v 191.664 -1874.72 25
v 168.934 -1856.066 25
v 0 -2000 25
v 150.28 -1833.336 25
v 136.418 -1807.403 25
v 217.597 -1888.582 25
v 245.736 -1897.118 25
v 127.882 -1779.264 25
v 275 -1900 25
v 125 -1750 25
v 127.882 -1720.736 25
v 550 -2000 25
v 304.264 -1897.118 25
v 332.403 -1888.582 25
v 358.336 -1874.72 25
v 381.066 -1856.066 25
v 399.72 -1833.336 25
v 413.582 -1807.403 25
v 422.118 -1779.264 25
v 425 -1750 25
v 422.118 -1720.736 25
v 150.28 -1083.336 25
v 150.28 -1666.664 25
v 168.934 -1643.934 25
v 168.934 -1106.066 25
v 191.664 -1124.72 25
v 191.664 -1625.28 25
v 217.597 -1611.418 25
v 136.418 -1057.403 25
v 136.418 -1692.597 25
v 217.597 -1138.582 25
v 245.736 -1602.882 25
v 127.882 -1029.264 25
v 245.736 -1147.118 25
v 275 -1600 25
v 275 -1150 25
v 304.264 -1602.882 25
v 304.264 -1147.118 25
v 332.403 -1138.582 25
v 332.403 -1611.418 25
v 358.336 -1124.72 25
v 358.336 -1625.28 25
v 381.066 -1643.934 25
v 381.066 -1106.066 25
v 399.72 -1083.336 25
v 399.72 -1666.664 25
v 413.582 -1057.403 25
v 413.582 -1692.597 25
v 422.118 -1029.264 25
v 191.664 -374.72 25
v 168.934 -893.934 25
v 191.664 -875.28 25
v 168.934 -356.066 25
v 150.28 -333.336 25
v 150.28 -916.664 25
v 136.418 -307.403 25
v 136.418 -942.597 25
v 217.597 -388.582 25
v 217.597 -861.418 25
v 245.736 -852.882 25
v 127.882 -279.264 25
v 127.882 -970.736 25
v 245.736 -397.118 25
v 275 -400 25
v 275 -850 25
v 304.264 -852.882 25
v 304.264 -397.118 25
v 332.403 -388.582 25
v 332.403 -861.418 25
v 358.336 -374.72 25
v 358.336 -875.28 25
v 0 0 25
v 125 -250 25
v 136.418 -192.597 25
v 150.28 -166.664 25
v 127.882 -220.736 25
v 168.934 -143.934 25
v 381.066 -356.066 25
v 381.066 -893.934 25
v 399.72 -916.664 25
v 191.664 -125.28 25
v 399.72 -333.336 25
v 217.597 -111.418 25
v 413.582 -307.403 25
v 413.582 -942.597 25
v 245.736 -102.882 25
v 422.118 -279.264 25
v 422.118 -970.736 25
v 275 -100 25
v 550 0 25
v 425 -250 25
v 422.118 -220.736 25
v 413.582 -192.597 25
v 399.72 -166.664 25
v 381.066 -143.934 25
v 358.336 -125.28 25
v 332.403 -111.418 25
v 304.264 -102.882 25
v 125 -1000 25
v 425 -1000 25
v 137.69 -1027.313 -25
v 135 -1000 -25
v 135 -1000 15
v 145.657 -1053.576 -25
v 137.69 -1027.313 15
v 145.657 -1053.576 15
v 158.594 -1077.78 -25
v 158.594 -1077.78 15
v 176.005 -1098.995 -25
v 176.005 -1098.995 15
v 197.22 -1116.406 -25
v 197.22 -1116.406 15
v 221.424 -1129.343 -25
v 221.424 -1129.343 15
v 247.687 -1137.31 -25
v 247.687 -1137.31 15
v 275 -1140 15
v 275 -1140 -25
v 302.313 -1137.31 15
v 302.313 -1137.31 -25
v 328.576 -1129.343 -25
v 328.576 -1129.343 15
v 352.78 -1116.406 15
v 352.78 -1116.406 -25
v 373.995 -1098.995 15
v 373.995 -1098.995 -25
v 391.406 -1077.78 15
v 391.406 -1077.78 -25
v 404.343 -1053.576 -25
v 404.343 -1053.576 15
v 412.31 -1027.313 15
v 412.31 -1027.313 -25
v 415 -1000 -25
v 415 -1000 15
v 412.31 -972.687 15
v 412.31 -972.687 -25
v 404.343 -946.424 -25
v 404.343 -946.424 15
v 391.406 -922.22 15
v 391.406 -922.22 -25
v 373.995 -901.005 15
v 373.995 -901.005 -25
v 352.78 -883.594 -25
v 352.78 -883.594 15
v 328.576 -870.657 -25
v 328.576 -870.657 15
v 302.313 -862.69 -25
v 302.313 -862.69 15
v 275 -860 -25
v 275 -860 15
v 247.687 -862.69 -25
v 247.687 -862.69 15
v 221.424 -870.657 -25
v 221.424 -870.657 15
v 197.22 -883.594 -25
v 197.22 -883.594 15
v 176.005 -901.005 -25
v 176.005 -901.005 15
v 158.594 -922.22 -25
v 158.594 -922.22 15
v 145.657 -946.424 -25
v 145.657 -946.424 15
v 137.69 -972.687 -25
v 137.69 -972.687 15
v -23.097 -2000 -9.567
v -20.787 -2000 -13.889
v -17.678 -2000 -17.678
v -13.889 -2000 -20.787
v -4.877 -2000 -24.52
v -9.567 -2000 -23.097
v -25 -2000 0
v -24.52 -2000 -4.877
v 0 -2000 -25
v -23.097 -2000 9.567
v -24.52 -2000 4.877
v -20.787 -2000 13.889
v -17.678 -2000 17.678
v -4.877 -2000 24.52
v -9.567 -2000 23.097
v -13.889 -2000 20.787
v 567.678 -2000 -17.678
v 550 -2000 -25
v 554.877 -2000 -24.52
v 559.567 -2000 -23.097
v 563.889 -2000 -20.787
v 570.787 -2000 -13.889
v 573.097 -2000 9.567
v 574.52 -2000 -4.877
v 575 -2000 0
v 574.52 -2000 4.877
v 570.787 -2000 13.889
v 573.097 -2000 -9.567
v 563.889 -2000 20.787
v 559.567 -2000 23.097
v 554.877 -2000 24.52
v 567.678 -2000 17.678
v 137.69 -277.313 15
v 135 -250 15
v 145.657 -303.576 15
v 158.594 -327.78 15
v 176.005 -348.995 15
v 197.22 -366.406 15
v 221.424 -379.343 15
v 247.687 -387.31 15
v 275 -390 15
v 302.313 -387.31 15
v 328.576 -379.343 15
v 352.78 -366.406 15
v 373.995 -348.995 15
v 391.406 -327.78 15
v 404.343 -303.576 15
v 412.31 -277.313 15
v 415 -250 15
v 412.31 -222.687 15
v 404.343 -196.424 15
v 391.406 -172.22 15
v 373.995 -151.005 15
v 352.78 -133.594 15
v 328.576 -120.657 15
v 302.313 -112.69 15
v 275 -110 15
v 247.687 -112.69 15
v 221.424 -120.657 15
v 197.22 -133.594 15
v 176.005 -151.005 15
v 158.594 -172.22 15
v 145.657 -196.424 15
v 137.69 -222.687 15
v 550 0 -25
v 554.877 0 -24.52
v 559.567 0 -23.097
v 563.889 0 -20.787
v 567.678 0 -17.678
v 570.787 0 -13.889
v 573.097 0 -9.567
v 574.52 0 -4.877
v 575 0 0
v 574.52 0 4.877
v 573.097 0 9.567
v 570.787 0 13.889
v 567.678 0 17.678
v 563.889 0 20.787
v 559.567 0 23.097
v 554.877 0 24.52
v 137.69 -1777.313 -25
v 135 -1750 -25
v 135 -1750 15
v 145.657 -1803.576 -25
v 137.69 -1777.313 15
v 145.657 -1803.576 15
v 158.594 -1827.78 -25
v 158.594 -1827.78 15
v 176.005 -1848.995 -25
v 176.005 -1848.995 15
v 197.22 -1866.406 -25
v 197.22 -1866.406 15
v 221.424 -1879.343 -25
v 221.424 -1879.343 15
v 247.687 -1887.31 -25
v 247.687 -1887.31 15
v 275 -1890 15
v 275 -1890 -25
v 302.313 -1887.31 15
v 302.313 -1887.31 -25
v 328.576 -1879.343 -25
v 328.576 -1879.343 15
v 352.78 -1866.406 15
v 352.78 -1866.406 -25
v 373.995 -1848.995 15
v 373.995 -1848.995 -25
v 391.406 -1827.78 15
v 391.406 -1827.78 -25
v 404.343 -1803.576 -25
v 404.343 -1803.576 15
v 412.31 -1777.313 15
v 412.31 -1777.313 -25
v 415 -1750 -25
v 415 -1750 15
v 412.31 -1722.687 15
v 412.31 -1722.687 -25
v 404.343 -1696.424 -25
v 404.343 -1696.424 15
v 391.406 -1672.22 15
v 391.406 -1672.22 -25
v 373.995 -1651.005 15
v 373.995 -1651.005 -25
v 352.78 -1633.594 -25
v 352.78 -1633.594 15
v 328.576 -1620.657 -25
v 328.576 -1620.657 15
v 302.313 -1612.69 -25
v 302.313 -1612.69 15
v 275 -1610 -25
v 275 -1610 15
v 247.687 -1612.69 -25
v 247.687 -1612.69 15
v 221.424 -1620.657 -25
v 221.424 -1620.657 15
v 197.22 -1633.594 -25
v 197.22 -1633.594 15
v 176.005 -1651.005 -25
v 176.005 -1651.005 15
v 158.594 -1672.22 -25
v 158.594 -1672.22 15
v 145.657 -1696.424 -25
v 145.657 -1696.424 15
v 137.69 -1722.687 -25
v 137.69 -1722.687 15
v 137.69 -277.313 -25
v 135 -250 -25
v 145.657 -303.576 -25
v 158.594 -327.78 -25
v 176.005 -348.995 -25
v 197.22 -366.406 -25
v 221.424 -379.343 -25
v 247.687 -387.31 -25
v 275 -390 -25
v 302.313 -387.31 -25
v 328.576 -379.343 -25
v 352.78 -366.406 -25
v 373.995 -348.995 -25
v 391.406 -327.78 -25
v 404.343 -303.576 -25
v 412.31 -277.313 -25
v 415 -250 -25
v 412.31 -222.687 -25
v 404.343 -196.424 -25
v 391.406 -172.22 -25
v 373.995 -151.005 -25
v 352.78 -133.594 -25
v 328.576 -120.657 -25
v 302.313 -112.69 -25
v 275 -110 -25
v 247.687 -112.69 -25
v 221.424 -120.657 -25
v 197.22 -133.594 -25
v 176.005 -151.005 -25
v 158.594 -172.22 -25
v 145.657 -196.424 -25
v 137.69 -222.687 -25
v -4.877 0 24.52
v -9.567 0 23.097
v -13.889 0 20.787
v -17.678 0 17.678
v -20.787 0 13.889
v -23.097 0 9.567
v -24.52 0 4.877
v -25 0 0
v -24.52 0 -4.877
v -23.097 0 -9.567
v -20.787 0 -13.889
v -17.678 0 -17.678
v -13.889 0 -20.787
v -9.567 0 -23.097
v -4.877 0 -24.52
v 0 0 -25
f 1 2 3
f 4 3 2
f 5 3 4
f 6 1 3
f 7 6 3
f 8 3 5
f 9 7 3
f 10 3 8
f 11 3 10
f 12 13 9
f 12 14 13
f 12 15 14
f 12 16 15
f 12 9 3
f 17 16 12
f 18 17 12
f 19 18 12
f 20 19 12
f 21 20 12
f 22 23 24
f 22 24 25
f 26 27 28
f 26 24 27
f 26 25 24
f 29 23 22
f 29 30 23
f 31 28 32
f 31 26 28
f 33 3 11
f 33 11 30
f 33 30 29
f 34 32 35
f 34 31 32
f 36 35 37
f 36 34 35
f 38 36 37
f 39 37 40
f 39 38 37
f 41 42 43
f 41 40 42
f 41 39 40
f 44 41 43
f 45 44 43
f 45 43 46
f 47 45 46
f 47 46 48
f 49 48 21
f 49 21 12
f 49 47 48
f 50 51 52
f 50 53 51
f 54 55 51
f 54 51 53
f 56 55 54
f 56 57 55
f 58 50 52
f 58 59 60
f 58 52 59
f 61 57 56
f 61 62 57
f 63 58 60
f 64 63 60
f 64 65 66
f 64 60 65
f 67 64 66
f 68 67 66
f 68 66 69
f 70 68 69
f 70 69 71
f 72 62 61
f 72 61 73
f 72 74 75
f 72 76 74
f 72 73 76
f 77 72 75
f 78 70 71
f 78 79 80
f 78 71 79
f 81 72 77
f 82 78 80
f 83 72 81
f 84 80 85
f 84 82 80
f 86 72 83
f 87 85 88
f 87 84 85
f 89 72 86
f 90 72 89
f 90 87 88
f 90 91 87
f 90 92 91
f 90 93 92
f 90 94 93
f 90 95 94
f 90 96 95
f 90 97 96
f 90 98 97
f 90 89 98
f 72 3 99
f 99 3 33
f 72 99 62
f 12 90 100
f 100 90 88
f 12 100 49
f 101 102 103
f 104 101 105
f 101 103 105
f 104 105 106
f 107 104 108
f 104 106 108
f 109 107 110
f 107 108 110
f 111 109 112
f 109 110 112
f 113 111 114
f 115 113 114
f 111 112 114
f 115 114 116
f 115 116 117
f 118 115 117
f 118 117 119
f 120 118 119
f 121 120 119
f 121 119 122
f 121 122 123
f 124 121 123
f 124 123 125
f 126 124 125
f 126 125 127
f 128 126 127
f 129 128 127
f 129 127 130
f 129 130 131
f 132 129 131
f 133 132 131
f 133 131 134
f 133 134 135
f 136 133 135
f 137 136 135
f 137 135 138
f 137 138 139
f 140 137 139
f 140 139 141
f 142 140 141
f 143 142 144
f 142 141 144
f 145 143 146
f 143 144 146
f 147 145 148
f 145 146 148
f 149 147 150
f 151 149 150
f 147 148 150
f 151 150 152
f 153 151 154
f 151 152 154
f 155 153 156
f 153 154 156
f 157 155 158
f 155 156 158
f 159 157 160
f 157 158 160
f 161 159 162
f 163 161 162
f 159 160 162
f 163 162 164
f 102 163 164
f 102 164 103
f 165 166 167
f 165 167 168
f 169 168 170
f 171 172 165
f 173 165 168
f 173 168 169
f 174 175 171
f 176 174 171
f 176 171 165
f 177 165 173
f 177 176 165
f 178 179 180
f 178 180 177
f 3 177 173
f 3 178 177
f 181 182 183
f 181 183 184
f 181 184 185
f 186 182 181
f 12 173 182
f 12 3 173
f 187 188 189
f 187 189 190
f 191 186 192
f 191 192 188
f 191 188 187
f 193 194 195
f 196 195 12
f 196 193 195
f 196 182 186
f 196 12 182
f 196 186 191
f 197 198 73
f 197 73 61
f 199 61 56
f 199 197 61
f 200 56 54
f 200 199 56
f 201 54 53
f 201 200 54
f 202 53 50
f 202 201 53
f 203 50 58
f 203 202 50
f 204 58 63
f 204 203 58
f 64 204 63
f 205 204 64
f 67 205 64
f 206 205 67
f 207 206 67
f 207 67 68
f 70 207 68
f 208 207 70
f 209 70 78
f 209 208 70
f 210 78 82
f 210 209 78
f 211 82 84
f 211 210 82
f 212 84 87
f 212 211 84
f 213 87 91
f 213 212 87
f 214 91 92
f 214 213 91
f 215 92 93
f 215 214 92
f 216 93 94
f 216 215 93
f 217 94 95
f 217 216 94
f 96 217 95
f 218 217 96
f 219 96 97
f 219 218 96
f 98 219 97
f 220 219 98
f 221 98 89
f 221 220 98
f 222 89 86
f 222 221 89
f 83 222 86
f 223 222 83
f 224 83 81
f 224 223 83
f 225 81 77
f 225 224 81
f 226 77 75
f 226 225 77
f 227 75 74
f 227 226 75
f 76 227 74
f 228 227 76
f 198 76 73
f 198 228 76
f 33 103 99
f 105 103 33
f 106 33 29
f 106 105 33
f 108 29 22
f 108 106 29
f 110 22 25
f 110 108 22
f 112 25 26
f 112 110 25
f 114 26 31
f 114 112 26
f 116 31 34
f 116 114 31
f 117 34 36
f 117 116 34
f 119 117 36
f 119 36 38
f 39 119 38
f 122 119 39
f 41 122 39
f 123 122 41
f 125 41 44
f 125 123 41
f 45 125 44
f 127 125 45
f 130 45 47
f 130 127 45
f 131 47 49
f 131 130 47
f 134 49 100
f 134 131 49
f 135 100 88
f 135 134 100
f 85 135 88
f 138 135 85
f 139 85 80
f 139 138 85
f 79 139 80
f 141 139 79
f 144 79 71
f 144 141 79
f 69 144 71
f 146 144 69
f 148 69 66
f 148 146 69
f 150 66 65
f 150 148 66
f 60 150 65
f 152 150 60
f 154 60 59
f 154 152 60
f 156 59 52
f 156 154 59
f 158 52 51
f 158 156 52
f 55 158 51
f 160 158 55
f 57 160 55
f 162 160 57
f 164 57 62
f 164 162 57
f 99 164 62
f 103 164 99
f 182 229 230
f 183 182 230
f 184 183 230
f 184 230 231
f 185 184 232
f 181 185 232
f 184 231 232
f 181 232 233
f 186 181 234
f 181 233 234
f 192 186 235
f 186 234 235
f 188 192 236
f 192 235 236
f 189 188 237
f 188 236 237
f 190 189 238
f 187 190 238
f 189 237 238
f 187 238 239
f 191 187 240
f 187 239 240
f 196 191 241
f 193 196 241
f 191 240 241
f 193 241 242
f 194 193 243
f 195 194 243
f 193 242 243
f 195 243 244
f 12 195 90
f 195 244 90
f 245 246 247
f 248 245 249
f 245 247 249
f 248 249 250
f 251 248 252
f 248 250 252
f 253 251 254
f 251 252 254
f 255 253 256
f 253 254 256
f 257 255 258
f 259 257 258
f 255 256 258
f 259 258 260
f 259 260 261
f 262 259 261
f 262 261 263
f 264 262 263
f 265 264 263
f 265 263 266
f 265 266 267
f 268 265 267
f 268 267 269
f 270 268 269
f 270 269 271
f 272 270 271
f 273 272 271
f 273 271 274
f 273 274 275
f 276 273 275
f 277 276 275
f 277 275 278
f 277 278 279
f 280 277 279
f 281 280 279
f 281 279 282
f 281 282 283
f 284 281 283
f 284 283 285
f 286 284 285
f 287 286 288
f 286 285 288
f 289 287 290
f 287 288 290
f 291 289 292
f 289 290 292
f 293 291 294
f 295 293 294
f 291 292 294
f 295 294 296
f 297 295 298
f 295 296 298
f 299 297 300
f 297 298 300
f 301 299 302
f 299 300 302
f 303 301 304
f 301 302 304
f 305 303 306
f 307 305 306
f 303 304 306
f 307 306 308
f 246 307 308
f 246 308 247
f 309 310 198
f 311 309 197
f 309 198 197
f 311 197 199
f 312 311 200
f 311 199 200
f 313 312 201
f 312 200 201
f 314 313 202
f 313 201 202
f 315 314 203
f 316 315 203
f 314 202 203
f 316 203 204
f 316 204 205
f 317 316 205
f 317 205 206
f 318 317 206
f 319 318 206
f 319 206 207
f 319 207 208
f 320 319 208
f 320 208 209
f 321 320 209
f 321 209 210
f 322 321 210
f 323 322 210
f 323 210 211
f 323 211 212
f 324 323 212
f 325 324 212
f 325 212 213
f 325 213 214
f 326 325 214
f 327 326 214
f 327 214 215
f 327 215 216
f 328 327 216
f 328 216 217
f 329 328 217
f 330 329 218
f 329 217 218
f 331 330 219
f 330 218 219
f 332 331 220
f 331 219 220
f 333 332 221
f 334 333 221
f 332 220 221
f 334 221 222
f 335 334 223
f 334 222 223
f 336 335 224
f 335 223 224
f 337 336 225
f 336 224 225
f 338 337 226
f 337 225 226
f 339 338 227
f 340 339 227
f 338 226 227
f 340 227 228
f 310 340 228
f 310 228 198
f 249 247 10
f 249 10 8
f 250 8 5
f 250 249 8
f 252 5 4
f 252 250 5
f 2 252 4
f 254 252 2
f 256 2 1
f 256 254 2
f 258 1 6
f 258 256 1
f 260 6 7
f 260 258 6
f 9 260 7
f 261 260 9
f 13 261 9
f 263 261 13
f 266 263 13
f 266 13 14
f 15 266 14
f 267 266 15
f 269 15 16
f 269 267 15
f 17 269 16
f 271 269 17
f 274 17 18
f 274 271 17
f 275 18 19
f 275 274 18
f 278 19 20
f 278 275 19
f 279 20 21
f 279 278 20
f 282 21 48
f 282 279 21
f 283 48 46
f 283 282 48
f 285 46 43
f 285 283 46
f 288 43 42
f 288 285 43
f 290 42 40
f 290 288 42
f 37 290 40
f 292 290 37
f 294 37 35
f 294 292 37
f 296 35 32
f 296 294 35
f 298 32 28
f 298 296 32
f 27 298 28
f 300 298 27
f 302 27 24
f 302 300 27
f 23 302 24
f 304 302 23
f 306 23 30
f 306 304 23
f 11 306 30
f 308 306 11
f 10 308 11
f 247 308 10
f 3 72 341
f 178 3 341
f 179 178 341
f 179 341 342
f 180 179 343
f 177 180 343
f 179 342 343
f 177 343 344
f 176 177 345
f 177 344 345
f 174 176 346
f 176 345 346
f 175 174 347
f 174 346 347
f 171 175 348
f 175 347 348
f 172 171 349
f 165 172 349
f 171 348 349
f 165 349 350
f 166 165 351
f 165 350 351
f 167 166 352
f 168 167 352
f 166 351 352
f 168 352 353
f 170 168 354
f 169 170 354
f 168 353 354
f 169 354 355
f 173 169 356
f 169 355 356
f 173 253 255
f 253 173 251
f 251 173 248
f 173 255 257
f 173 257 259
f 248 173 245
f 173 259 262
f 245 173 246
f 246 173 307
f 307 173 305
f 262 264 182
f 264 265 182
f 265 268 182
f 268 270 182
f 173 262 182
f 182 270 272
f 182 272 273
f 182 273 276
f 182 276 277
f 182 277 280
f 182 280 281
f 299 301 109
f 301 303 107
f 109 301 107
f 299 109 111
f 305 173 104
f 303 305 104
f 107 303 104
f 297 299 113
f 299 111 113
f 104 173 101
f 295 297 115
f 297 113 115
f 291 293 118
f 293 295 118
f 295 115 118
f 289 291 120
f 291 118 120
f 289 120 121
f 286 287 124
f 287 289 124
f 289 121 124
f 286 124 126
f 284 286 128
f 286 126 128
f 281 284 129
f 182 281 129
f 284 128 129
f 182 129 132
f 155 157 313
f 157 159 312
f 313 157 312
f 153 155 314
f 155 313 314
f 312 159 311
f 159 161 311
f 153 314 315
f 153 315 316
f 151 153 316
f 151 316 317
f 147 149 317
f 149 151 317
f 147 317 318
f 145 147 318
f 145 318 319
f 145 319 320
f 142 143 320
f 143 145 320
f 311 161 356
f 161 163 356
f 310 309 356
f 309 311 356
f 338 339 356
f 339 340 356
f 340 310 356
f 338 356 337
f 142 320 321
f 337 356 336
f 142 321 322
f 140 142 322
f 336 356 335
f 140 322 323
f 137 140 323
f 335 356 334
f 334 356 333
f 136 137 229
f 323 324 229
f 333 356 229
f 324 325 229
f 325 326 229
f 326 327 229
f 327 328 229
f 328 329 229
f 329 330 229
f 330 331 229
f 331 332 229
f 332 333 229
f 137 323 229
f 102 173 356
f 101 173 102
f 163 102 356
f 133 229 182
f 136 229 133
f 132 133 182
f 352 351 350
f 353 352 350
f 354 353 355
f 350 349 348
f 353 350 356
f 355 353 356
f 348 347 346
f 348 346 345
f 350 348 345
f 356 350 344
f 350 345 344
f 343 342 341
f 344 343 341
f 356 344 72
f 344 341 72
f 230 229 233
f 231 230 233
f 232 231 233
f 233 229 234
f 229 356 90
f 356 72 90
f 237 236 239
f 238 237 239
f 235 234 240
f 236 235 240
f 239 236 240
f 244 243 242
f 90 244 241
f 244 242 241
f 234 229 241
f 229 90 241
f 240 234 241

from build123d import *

# Parameters (mm, degrees)
PAD_DEPTH    = 2000
SKETCH001_R  = 140
POCKET_DEPTH = 50.001
CHAMFER_SIZE = 10


with BuildPart() as part:
    # Sketch → Pad (new body)
    with BuildSketch(Plane.XZ):
        with BuildLine():
            ThreePointArc((0, 25), (-25, 0), (0, -25))
            Line((0, -25), (550, -25))
            ThreePointArc((550, -25), (575, 0), (550, 25))
            Line((0, 25), (550, 25))
        make_face()
    extrude(amount=PAD_DEPTH)

    # Sketch001 (on Face4 of Pad) → Pocket (cut, through all)
    with BuildSketch(Plane(origin=(0, 0, 25), x_dir=(-1, 0, 0), z_dir=(0, 0, 1))):
        with Locations((-275, 1750)):
            Circle(SKETCH001_R)
        with Locations((-275, 1000)):
            Circle(SKETCH001_R)
        with Locations((-275, 250)):
            Circle(SKETCH001_R)
    extrude(amount=-POCKET_DEPTH, mode=Mode.SUBTRACT)

    # Chamfer
    chamfer_edges = [part.edges().sort_by_distance(p)[0] for p in [
        (415, -1750, 25),
        (415, -1000, 25),
        (415, -250, 25),
    ]]
    chamfer(chamfer_edges, length=CHAMFER_SIZE)


solid = part.part
